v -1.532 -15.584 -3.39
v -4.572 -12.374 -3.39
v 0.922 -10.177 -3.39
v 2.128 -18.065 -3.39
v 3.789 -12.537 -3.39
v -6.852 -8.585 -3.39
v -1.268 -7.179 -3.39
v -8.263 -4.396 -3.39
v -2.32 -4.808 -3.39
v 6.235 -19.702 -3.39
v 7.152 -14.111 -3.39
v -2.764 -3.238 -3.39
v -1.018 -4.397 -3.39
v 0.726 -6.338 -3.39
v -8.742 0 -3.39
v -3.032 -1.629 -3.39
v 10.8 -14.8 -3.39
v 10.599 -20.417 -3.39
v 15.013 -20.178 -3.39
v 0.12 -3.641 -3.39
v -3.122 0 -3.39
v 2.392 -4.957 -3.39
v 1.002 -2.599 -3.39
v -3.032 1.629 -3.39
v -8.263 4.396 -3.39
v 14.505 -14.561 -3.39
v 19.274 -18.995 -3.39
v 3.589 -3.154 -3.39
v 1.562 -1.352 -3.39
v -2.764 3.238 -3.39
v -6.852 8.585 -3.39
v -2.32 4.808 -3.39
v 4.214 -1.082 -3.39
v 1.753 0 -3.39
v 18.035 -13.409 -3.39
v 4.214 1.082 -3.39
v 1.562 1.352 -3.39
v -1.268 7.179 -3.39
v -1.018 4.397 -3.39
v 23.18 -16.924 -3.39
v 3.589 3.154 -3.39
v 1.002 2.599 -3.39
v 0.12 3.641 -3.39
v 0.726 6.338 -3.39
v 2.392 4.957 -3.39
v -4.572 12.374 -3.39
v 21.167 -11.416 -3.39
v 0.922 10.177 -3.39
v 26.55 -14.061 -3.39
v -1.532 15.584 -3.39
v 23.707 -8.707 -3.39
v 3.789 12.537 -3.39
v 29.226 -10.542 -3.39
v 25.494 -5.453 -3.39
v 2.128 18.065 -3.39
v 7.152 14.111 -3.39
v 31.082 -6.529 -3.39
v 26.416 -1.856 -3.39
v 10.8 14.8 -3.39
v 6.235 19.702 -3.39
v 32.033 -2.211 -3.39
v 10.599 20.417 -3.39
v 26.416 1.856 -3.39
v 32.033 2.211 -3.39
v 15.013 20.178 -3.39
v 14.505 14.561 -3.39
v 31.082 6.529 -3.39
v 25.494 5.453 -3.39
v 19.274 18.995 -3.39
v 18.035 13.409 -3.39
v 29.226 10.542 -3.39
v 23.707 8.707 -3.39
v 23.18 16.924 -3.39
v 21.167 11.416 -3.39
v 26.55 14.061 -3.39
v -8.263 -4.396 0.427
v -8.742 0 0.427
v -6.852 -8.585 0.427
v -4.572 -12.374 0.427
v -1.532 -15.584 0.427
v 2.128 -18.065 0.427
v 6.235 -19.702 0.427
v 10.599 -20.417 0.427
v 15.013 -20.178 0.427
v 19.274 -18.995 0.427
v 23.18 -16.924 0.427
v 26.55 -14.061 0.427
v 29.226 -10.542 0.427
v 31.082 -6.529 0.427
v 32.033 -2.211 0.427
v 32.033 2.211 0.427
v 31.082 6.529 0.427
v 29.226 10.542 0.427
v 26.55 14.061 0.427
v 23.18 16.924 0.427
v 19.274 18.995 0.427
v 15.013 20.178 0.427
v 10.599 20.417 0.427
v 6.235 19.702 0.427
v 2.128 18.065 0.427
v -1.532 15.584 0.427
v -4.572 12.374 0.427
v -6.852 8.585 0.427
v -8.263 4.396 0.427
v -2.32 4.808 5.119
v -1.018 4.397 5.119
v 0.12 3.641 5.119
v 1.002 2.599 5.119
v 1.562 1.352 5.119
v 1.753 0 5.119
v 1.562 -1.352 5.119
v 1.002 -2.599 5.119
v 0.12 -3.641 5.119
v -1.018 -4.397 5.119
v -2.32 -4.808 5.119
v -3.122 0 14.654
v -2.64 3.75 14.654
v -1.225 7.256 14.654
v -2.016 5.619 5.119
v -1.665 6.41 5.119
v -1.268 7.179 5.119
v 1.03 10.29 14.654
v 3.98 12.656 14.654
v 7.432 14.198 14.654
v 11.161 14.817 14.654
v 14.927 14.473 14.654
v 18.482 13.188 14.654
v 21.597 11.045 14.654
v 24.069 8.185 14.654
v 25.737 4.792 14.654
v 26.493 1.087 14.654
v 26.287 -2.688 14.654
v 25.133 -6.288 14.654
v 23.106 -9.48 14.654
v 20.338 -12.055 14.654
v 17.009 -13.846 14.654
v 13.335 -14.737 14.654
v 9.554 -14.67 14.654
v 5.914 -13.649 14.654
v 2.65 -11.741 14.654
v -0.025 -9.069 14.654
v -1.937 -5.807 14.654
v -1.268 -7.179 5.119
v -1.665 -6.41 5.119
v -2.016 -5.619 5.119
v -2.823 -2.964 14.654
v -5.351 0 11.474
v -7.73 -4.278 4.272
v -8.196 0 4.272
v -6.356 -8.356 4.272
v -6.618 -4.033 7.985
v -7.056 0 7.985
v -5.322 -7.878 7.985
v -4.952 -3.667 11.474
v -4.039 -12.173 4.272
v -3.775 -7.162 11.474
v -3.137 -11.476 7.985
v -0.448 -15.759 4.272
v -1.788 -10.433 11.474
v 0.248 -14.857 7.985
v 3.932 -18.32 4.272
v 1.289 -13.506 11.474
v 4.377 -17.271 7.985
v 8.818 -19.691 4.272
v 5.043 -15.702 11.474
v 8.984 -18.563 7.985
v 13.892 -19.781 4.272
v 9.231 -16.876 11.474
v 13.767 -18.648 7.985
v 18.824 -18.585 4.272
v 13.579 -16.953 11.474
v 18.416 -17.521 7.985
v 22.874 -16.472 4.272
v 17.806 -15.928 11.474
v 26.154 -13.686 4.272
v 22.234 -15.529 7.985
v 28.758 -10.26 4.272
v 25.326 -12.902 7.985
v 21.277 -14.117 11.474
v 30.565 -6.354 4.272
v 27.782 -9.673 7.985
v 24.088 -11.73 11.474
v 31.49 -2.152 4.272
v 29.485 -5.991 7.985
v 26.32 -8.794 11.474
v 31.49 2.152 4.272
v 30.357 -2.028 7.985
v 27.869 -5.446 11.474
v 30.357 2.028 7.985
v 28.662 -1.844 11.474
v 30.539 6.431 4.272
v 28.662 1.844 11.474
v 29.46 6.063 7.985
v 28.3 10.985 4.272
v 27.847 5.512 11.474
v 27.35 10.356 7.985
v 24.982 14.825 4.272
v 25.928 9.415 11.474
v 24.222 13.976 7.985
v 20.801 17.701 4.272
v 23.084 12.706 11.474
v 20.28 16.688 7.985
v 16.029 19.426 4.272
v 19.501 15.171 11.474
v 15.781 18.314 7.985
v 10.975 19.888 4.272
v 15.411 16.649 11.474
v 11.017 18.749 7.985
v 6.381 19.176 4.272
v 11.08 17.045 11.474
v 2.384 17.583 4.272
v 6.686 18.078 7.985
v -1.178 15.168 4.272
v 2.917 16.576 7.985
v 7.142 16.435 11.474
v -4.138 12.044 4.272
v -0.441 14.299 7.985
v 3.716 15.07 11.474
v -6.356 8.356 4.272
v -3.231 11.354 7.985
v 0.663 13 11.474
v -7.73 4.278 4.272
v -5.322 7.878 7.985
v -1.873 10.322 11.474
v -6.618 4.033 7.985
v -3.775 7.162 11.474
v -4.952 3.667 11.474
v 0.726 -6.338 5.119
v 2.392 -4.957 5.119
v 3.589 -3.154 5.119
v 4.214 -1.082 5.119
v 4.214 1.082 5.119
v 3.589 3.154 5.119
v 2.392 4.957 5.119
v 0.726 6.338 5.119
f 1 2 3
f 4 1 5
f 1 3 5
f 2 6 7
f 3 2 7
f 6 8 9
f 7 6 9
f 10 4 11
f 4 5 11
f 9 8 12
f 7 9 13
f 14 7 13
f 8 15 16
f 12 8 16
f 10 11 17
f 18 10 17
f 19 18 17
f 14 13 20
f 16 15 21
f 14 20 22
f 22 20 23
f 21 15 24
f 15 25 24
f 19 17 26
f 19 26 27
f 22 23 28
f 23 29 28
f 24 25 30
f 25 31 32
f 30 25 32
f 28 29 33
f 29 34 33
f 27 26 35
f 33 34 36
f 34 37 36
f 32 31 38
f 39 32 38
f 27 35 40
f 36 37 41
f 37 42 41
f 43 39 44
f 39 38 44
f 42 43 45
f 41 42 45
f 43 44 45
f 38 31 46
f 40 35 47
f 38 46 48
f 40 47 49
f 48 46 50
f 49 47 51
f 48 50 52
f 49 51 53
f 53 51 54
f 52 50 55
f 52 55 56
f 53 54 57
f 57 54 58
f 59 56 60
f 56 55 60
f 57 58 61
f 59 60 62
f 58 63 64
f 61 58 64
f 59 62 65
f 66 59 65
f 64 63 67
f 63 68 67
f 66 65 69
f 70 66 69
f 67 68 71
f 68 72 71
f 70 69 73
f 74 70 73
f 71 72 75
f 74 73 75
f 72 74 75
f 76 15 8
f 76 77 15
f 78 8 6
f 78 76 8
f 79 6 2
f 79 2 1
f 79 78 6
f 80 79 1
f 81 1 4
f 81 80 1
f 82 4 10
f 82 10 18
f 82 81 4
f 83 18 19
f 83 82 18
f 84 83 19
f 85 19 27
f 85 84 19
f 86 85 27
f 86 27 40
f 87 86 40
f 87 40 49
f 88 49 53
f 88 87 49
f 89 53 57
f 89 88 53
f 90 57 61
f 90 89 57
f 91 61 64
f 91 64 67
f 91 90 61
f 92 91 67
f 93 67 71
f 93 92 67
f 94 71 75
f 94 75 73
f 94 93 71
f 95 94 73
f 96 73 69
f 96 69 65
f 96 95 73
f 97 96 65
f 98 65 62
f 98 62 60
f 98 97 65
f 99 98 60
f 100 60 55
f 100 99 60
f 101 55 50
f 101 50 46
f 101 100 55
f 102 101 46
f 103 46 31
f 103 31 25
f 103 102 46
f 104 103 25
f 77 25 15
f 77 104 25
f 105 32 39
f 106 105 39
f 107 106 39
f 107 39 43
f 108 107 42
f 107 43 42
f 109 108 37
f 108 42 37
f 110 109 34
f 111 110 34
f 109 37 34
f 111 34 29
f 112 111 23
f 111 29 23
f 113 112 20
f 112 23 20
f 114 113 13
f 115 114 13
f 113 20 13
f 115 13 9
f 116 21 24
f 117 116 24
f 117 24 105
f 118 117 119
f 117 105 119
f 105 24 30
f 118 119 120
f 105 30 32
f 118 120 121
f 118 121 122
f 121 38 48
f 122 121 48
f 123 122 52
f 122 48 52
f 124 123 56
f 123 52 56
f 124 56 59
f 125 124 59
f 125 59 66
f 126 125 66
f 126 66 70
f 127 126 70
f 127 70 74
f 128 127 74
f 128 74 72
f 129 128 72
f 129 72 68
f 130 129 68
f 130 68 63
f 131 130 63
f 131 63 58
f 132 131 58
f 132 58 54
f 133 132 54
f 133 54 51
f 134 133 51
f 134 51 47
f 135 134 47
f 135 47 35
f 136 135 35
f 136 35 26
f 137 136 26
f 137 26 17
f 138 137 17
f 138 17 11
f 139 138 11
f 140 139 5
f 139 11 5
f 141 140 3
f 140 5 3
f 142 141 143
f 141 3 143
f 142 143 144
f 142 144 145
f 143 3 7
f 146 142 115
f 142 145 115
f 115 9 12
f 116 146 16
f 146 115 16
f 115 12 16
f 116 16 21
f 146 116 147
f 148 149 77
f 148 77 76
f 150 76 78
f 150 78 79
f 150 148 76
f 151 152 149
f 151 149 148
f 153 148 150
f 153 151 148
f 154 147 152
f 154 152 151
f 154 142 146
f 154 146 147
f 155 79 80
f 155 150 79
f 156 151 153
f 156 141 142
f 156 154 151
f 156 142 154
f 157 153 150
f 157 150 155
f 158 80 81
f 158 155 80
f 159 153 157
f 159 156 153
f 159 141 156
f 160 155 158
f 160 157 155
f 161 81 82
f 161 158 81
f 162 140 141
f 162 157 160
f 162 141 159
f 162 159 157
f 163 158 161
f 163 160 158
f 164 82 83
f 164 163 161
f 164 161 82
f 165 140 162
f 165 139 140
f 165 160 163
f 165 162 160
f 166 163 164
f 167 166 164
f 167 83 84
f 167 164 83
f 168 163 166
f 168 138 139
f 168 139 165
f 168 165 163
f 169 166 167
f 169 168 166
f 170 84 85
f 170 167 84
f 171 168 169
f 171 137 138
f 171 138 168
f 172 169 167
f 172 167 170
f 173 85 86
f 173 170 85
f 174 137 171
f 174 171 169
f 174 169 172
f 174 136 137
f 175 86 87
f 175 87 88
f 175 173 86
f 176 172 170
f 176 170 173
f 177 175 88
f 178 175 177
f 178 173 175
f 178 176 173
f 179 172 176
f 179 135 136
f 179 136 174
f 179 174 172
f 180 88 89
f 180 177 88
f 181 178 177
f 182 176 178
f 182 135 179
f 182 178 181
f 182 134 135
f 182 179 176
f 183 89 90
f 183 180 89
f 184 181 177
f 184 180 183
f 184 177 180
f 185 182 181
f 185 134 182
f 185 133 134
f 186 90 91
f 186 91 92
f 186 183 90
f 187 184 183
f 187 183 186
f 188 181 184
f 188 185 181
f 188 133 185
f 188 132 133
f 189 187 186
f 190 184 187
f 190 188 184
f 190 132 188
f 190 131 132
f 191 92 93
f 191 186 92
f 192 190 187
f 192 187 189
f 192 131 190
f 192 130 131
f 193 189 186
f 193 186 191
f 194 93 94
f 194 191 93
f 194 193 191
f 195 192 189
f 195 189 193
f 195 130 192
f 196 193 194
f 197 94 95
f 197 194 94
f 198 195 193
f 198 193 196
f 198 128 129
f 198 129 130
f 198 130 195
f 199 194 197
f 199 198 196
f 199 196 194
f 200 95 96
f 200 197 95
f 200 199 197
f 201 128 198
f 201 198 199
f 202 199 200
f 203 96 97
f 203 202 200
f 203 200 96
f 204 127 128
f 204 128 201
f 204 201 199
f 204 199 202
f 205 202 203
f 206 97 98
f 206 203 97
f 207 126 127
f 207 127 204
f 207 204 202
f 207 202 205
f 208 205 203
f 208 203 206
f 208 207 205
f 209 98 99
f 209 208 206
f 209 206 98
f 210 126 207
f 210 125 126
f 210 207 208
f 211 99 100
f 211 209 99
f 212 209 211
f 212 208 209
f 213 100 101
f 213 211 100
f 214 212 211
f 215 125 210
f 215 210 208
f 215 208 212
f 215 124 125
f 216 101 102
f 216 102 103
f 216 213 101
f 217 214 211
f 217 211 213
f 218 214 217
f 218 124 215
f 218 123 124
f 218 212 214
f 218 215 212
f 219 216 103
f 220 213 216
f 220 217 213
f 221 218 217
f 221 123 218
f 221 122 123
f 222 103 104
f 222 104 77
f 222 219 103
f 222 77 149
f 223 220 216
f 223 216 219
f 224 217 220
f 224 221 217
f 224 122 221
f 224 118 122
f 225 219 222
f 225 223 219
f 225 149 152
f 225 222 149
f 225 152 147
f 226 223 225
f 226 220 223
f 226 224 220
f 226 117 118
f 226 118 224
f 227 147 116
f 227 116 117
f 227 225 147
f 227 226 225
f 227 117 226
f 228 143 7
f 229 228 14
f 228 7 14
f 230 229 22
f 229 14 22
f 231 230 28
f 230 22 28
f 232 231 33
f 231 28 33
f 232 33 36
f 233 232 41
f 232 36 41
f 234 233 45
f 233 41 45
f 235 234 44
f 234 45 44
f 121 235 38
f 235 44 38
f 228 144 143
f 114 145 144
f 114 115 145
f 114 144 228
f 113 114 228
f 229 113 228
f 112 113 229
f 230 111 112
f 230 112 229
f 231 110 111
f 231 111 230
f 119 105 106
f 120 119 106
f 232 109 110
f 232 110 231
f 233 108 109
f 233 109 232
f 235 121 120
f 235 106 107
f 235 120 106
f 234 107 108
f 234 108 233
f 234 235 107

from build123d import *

# Parameters (mm, degrees)
SKETCH4_R           = 14.82725
CUT_EXTRUDE2_DEPTH  = 47.51766397
EXTRUDE_THIN1_DEPTH = 8.509


with BuildPart() as part:
    # Sketch1 → Revolve1 (revolve)
    with BuildSketch(Plane(origin=(0, 0, 0), x_dir=(1, 0, 0), z_dir=(0, 1, 0))):
        with BuildLine():
            Line((-8.741518228, 3.389570958), (-8.741518228, -0.427226446))
            ThreePointArc((-8.741518228, -0.427226446), (-2.478936495, -15.402502765), (11.705481772, -23.294340903))
            Line((11.705481772, -23.294340903), (11.705481772, 3.389570958))
            Line((11.705481772, 3.389570958), (-8.741518228, 3.389570958))
        make_face()
    revolve(axis=Axis((11.705481772, 0, -3.389570958), (0, 0, 1)))

    # Sketch4 → Cut-Extrude2 (cut, through all)
    with BuildSketch(Plane(origin=(0, 0, -3.389570958), x_dir=(-1, 0, 0), z_dir=(0, 0, -1))):
        with Locations((-11.705481772, 0)):
            Circle(SKETCH4_R)
    extrude(amount=-CUT_EXTRUDE2_DEPTH, mode=Mode.SUBTRACT)

    # Sketch5 → Extrude-Thin1 (add)
    with BuildSketch(Plane(origin=(0, 0, -3.389570958), x_dir=(-1, 0, 0), z_dir=(0, 0, -1))):
        with BuildLine():
            ThreePointArc((2.320448494, 4.808390867), (-1.752935461, 0), (2.320448494, -4.808390867))
            Line((2.320448494, -4.808390867), (1.902914987, -7.313838087))
            ThreePointArc((1.902914987, -7.313838087), (-4.292935461, 0), (1.902914987, 7.313838087))
            Line((1.902914987, 7.313838087), (2.320448494, 4.808390867))
        make_face()
    extrude(amount=-EXTRUDE_THIN1_DEPTH)


solid = part.part
